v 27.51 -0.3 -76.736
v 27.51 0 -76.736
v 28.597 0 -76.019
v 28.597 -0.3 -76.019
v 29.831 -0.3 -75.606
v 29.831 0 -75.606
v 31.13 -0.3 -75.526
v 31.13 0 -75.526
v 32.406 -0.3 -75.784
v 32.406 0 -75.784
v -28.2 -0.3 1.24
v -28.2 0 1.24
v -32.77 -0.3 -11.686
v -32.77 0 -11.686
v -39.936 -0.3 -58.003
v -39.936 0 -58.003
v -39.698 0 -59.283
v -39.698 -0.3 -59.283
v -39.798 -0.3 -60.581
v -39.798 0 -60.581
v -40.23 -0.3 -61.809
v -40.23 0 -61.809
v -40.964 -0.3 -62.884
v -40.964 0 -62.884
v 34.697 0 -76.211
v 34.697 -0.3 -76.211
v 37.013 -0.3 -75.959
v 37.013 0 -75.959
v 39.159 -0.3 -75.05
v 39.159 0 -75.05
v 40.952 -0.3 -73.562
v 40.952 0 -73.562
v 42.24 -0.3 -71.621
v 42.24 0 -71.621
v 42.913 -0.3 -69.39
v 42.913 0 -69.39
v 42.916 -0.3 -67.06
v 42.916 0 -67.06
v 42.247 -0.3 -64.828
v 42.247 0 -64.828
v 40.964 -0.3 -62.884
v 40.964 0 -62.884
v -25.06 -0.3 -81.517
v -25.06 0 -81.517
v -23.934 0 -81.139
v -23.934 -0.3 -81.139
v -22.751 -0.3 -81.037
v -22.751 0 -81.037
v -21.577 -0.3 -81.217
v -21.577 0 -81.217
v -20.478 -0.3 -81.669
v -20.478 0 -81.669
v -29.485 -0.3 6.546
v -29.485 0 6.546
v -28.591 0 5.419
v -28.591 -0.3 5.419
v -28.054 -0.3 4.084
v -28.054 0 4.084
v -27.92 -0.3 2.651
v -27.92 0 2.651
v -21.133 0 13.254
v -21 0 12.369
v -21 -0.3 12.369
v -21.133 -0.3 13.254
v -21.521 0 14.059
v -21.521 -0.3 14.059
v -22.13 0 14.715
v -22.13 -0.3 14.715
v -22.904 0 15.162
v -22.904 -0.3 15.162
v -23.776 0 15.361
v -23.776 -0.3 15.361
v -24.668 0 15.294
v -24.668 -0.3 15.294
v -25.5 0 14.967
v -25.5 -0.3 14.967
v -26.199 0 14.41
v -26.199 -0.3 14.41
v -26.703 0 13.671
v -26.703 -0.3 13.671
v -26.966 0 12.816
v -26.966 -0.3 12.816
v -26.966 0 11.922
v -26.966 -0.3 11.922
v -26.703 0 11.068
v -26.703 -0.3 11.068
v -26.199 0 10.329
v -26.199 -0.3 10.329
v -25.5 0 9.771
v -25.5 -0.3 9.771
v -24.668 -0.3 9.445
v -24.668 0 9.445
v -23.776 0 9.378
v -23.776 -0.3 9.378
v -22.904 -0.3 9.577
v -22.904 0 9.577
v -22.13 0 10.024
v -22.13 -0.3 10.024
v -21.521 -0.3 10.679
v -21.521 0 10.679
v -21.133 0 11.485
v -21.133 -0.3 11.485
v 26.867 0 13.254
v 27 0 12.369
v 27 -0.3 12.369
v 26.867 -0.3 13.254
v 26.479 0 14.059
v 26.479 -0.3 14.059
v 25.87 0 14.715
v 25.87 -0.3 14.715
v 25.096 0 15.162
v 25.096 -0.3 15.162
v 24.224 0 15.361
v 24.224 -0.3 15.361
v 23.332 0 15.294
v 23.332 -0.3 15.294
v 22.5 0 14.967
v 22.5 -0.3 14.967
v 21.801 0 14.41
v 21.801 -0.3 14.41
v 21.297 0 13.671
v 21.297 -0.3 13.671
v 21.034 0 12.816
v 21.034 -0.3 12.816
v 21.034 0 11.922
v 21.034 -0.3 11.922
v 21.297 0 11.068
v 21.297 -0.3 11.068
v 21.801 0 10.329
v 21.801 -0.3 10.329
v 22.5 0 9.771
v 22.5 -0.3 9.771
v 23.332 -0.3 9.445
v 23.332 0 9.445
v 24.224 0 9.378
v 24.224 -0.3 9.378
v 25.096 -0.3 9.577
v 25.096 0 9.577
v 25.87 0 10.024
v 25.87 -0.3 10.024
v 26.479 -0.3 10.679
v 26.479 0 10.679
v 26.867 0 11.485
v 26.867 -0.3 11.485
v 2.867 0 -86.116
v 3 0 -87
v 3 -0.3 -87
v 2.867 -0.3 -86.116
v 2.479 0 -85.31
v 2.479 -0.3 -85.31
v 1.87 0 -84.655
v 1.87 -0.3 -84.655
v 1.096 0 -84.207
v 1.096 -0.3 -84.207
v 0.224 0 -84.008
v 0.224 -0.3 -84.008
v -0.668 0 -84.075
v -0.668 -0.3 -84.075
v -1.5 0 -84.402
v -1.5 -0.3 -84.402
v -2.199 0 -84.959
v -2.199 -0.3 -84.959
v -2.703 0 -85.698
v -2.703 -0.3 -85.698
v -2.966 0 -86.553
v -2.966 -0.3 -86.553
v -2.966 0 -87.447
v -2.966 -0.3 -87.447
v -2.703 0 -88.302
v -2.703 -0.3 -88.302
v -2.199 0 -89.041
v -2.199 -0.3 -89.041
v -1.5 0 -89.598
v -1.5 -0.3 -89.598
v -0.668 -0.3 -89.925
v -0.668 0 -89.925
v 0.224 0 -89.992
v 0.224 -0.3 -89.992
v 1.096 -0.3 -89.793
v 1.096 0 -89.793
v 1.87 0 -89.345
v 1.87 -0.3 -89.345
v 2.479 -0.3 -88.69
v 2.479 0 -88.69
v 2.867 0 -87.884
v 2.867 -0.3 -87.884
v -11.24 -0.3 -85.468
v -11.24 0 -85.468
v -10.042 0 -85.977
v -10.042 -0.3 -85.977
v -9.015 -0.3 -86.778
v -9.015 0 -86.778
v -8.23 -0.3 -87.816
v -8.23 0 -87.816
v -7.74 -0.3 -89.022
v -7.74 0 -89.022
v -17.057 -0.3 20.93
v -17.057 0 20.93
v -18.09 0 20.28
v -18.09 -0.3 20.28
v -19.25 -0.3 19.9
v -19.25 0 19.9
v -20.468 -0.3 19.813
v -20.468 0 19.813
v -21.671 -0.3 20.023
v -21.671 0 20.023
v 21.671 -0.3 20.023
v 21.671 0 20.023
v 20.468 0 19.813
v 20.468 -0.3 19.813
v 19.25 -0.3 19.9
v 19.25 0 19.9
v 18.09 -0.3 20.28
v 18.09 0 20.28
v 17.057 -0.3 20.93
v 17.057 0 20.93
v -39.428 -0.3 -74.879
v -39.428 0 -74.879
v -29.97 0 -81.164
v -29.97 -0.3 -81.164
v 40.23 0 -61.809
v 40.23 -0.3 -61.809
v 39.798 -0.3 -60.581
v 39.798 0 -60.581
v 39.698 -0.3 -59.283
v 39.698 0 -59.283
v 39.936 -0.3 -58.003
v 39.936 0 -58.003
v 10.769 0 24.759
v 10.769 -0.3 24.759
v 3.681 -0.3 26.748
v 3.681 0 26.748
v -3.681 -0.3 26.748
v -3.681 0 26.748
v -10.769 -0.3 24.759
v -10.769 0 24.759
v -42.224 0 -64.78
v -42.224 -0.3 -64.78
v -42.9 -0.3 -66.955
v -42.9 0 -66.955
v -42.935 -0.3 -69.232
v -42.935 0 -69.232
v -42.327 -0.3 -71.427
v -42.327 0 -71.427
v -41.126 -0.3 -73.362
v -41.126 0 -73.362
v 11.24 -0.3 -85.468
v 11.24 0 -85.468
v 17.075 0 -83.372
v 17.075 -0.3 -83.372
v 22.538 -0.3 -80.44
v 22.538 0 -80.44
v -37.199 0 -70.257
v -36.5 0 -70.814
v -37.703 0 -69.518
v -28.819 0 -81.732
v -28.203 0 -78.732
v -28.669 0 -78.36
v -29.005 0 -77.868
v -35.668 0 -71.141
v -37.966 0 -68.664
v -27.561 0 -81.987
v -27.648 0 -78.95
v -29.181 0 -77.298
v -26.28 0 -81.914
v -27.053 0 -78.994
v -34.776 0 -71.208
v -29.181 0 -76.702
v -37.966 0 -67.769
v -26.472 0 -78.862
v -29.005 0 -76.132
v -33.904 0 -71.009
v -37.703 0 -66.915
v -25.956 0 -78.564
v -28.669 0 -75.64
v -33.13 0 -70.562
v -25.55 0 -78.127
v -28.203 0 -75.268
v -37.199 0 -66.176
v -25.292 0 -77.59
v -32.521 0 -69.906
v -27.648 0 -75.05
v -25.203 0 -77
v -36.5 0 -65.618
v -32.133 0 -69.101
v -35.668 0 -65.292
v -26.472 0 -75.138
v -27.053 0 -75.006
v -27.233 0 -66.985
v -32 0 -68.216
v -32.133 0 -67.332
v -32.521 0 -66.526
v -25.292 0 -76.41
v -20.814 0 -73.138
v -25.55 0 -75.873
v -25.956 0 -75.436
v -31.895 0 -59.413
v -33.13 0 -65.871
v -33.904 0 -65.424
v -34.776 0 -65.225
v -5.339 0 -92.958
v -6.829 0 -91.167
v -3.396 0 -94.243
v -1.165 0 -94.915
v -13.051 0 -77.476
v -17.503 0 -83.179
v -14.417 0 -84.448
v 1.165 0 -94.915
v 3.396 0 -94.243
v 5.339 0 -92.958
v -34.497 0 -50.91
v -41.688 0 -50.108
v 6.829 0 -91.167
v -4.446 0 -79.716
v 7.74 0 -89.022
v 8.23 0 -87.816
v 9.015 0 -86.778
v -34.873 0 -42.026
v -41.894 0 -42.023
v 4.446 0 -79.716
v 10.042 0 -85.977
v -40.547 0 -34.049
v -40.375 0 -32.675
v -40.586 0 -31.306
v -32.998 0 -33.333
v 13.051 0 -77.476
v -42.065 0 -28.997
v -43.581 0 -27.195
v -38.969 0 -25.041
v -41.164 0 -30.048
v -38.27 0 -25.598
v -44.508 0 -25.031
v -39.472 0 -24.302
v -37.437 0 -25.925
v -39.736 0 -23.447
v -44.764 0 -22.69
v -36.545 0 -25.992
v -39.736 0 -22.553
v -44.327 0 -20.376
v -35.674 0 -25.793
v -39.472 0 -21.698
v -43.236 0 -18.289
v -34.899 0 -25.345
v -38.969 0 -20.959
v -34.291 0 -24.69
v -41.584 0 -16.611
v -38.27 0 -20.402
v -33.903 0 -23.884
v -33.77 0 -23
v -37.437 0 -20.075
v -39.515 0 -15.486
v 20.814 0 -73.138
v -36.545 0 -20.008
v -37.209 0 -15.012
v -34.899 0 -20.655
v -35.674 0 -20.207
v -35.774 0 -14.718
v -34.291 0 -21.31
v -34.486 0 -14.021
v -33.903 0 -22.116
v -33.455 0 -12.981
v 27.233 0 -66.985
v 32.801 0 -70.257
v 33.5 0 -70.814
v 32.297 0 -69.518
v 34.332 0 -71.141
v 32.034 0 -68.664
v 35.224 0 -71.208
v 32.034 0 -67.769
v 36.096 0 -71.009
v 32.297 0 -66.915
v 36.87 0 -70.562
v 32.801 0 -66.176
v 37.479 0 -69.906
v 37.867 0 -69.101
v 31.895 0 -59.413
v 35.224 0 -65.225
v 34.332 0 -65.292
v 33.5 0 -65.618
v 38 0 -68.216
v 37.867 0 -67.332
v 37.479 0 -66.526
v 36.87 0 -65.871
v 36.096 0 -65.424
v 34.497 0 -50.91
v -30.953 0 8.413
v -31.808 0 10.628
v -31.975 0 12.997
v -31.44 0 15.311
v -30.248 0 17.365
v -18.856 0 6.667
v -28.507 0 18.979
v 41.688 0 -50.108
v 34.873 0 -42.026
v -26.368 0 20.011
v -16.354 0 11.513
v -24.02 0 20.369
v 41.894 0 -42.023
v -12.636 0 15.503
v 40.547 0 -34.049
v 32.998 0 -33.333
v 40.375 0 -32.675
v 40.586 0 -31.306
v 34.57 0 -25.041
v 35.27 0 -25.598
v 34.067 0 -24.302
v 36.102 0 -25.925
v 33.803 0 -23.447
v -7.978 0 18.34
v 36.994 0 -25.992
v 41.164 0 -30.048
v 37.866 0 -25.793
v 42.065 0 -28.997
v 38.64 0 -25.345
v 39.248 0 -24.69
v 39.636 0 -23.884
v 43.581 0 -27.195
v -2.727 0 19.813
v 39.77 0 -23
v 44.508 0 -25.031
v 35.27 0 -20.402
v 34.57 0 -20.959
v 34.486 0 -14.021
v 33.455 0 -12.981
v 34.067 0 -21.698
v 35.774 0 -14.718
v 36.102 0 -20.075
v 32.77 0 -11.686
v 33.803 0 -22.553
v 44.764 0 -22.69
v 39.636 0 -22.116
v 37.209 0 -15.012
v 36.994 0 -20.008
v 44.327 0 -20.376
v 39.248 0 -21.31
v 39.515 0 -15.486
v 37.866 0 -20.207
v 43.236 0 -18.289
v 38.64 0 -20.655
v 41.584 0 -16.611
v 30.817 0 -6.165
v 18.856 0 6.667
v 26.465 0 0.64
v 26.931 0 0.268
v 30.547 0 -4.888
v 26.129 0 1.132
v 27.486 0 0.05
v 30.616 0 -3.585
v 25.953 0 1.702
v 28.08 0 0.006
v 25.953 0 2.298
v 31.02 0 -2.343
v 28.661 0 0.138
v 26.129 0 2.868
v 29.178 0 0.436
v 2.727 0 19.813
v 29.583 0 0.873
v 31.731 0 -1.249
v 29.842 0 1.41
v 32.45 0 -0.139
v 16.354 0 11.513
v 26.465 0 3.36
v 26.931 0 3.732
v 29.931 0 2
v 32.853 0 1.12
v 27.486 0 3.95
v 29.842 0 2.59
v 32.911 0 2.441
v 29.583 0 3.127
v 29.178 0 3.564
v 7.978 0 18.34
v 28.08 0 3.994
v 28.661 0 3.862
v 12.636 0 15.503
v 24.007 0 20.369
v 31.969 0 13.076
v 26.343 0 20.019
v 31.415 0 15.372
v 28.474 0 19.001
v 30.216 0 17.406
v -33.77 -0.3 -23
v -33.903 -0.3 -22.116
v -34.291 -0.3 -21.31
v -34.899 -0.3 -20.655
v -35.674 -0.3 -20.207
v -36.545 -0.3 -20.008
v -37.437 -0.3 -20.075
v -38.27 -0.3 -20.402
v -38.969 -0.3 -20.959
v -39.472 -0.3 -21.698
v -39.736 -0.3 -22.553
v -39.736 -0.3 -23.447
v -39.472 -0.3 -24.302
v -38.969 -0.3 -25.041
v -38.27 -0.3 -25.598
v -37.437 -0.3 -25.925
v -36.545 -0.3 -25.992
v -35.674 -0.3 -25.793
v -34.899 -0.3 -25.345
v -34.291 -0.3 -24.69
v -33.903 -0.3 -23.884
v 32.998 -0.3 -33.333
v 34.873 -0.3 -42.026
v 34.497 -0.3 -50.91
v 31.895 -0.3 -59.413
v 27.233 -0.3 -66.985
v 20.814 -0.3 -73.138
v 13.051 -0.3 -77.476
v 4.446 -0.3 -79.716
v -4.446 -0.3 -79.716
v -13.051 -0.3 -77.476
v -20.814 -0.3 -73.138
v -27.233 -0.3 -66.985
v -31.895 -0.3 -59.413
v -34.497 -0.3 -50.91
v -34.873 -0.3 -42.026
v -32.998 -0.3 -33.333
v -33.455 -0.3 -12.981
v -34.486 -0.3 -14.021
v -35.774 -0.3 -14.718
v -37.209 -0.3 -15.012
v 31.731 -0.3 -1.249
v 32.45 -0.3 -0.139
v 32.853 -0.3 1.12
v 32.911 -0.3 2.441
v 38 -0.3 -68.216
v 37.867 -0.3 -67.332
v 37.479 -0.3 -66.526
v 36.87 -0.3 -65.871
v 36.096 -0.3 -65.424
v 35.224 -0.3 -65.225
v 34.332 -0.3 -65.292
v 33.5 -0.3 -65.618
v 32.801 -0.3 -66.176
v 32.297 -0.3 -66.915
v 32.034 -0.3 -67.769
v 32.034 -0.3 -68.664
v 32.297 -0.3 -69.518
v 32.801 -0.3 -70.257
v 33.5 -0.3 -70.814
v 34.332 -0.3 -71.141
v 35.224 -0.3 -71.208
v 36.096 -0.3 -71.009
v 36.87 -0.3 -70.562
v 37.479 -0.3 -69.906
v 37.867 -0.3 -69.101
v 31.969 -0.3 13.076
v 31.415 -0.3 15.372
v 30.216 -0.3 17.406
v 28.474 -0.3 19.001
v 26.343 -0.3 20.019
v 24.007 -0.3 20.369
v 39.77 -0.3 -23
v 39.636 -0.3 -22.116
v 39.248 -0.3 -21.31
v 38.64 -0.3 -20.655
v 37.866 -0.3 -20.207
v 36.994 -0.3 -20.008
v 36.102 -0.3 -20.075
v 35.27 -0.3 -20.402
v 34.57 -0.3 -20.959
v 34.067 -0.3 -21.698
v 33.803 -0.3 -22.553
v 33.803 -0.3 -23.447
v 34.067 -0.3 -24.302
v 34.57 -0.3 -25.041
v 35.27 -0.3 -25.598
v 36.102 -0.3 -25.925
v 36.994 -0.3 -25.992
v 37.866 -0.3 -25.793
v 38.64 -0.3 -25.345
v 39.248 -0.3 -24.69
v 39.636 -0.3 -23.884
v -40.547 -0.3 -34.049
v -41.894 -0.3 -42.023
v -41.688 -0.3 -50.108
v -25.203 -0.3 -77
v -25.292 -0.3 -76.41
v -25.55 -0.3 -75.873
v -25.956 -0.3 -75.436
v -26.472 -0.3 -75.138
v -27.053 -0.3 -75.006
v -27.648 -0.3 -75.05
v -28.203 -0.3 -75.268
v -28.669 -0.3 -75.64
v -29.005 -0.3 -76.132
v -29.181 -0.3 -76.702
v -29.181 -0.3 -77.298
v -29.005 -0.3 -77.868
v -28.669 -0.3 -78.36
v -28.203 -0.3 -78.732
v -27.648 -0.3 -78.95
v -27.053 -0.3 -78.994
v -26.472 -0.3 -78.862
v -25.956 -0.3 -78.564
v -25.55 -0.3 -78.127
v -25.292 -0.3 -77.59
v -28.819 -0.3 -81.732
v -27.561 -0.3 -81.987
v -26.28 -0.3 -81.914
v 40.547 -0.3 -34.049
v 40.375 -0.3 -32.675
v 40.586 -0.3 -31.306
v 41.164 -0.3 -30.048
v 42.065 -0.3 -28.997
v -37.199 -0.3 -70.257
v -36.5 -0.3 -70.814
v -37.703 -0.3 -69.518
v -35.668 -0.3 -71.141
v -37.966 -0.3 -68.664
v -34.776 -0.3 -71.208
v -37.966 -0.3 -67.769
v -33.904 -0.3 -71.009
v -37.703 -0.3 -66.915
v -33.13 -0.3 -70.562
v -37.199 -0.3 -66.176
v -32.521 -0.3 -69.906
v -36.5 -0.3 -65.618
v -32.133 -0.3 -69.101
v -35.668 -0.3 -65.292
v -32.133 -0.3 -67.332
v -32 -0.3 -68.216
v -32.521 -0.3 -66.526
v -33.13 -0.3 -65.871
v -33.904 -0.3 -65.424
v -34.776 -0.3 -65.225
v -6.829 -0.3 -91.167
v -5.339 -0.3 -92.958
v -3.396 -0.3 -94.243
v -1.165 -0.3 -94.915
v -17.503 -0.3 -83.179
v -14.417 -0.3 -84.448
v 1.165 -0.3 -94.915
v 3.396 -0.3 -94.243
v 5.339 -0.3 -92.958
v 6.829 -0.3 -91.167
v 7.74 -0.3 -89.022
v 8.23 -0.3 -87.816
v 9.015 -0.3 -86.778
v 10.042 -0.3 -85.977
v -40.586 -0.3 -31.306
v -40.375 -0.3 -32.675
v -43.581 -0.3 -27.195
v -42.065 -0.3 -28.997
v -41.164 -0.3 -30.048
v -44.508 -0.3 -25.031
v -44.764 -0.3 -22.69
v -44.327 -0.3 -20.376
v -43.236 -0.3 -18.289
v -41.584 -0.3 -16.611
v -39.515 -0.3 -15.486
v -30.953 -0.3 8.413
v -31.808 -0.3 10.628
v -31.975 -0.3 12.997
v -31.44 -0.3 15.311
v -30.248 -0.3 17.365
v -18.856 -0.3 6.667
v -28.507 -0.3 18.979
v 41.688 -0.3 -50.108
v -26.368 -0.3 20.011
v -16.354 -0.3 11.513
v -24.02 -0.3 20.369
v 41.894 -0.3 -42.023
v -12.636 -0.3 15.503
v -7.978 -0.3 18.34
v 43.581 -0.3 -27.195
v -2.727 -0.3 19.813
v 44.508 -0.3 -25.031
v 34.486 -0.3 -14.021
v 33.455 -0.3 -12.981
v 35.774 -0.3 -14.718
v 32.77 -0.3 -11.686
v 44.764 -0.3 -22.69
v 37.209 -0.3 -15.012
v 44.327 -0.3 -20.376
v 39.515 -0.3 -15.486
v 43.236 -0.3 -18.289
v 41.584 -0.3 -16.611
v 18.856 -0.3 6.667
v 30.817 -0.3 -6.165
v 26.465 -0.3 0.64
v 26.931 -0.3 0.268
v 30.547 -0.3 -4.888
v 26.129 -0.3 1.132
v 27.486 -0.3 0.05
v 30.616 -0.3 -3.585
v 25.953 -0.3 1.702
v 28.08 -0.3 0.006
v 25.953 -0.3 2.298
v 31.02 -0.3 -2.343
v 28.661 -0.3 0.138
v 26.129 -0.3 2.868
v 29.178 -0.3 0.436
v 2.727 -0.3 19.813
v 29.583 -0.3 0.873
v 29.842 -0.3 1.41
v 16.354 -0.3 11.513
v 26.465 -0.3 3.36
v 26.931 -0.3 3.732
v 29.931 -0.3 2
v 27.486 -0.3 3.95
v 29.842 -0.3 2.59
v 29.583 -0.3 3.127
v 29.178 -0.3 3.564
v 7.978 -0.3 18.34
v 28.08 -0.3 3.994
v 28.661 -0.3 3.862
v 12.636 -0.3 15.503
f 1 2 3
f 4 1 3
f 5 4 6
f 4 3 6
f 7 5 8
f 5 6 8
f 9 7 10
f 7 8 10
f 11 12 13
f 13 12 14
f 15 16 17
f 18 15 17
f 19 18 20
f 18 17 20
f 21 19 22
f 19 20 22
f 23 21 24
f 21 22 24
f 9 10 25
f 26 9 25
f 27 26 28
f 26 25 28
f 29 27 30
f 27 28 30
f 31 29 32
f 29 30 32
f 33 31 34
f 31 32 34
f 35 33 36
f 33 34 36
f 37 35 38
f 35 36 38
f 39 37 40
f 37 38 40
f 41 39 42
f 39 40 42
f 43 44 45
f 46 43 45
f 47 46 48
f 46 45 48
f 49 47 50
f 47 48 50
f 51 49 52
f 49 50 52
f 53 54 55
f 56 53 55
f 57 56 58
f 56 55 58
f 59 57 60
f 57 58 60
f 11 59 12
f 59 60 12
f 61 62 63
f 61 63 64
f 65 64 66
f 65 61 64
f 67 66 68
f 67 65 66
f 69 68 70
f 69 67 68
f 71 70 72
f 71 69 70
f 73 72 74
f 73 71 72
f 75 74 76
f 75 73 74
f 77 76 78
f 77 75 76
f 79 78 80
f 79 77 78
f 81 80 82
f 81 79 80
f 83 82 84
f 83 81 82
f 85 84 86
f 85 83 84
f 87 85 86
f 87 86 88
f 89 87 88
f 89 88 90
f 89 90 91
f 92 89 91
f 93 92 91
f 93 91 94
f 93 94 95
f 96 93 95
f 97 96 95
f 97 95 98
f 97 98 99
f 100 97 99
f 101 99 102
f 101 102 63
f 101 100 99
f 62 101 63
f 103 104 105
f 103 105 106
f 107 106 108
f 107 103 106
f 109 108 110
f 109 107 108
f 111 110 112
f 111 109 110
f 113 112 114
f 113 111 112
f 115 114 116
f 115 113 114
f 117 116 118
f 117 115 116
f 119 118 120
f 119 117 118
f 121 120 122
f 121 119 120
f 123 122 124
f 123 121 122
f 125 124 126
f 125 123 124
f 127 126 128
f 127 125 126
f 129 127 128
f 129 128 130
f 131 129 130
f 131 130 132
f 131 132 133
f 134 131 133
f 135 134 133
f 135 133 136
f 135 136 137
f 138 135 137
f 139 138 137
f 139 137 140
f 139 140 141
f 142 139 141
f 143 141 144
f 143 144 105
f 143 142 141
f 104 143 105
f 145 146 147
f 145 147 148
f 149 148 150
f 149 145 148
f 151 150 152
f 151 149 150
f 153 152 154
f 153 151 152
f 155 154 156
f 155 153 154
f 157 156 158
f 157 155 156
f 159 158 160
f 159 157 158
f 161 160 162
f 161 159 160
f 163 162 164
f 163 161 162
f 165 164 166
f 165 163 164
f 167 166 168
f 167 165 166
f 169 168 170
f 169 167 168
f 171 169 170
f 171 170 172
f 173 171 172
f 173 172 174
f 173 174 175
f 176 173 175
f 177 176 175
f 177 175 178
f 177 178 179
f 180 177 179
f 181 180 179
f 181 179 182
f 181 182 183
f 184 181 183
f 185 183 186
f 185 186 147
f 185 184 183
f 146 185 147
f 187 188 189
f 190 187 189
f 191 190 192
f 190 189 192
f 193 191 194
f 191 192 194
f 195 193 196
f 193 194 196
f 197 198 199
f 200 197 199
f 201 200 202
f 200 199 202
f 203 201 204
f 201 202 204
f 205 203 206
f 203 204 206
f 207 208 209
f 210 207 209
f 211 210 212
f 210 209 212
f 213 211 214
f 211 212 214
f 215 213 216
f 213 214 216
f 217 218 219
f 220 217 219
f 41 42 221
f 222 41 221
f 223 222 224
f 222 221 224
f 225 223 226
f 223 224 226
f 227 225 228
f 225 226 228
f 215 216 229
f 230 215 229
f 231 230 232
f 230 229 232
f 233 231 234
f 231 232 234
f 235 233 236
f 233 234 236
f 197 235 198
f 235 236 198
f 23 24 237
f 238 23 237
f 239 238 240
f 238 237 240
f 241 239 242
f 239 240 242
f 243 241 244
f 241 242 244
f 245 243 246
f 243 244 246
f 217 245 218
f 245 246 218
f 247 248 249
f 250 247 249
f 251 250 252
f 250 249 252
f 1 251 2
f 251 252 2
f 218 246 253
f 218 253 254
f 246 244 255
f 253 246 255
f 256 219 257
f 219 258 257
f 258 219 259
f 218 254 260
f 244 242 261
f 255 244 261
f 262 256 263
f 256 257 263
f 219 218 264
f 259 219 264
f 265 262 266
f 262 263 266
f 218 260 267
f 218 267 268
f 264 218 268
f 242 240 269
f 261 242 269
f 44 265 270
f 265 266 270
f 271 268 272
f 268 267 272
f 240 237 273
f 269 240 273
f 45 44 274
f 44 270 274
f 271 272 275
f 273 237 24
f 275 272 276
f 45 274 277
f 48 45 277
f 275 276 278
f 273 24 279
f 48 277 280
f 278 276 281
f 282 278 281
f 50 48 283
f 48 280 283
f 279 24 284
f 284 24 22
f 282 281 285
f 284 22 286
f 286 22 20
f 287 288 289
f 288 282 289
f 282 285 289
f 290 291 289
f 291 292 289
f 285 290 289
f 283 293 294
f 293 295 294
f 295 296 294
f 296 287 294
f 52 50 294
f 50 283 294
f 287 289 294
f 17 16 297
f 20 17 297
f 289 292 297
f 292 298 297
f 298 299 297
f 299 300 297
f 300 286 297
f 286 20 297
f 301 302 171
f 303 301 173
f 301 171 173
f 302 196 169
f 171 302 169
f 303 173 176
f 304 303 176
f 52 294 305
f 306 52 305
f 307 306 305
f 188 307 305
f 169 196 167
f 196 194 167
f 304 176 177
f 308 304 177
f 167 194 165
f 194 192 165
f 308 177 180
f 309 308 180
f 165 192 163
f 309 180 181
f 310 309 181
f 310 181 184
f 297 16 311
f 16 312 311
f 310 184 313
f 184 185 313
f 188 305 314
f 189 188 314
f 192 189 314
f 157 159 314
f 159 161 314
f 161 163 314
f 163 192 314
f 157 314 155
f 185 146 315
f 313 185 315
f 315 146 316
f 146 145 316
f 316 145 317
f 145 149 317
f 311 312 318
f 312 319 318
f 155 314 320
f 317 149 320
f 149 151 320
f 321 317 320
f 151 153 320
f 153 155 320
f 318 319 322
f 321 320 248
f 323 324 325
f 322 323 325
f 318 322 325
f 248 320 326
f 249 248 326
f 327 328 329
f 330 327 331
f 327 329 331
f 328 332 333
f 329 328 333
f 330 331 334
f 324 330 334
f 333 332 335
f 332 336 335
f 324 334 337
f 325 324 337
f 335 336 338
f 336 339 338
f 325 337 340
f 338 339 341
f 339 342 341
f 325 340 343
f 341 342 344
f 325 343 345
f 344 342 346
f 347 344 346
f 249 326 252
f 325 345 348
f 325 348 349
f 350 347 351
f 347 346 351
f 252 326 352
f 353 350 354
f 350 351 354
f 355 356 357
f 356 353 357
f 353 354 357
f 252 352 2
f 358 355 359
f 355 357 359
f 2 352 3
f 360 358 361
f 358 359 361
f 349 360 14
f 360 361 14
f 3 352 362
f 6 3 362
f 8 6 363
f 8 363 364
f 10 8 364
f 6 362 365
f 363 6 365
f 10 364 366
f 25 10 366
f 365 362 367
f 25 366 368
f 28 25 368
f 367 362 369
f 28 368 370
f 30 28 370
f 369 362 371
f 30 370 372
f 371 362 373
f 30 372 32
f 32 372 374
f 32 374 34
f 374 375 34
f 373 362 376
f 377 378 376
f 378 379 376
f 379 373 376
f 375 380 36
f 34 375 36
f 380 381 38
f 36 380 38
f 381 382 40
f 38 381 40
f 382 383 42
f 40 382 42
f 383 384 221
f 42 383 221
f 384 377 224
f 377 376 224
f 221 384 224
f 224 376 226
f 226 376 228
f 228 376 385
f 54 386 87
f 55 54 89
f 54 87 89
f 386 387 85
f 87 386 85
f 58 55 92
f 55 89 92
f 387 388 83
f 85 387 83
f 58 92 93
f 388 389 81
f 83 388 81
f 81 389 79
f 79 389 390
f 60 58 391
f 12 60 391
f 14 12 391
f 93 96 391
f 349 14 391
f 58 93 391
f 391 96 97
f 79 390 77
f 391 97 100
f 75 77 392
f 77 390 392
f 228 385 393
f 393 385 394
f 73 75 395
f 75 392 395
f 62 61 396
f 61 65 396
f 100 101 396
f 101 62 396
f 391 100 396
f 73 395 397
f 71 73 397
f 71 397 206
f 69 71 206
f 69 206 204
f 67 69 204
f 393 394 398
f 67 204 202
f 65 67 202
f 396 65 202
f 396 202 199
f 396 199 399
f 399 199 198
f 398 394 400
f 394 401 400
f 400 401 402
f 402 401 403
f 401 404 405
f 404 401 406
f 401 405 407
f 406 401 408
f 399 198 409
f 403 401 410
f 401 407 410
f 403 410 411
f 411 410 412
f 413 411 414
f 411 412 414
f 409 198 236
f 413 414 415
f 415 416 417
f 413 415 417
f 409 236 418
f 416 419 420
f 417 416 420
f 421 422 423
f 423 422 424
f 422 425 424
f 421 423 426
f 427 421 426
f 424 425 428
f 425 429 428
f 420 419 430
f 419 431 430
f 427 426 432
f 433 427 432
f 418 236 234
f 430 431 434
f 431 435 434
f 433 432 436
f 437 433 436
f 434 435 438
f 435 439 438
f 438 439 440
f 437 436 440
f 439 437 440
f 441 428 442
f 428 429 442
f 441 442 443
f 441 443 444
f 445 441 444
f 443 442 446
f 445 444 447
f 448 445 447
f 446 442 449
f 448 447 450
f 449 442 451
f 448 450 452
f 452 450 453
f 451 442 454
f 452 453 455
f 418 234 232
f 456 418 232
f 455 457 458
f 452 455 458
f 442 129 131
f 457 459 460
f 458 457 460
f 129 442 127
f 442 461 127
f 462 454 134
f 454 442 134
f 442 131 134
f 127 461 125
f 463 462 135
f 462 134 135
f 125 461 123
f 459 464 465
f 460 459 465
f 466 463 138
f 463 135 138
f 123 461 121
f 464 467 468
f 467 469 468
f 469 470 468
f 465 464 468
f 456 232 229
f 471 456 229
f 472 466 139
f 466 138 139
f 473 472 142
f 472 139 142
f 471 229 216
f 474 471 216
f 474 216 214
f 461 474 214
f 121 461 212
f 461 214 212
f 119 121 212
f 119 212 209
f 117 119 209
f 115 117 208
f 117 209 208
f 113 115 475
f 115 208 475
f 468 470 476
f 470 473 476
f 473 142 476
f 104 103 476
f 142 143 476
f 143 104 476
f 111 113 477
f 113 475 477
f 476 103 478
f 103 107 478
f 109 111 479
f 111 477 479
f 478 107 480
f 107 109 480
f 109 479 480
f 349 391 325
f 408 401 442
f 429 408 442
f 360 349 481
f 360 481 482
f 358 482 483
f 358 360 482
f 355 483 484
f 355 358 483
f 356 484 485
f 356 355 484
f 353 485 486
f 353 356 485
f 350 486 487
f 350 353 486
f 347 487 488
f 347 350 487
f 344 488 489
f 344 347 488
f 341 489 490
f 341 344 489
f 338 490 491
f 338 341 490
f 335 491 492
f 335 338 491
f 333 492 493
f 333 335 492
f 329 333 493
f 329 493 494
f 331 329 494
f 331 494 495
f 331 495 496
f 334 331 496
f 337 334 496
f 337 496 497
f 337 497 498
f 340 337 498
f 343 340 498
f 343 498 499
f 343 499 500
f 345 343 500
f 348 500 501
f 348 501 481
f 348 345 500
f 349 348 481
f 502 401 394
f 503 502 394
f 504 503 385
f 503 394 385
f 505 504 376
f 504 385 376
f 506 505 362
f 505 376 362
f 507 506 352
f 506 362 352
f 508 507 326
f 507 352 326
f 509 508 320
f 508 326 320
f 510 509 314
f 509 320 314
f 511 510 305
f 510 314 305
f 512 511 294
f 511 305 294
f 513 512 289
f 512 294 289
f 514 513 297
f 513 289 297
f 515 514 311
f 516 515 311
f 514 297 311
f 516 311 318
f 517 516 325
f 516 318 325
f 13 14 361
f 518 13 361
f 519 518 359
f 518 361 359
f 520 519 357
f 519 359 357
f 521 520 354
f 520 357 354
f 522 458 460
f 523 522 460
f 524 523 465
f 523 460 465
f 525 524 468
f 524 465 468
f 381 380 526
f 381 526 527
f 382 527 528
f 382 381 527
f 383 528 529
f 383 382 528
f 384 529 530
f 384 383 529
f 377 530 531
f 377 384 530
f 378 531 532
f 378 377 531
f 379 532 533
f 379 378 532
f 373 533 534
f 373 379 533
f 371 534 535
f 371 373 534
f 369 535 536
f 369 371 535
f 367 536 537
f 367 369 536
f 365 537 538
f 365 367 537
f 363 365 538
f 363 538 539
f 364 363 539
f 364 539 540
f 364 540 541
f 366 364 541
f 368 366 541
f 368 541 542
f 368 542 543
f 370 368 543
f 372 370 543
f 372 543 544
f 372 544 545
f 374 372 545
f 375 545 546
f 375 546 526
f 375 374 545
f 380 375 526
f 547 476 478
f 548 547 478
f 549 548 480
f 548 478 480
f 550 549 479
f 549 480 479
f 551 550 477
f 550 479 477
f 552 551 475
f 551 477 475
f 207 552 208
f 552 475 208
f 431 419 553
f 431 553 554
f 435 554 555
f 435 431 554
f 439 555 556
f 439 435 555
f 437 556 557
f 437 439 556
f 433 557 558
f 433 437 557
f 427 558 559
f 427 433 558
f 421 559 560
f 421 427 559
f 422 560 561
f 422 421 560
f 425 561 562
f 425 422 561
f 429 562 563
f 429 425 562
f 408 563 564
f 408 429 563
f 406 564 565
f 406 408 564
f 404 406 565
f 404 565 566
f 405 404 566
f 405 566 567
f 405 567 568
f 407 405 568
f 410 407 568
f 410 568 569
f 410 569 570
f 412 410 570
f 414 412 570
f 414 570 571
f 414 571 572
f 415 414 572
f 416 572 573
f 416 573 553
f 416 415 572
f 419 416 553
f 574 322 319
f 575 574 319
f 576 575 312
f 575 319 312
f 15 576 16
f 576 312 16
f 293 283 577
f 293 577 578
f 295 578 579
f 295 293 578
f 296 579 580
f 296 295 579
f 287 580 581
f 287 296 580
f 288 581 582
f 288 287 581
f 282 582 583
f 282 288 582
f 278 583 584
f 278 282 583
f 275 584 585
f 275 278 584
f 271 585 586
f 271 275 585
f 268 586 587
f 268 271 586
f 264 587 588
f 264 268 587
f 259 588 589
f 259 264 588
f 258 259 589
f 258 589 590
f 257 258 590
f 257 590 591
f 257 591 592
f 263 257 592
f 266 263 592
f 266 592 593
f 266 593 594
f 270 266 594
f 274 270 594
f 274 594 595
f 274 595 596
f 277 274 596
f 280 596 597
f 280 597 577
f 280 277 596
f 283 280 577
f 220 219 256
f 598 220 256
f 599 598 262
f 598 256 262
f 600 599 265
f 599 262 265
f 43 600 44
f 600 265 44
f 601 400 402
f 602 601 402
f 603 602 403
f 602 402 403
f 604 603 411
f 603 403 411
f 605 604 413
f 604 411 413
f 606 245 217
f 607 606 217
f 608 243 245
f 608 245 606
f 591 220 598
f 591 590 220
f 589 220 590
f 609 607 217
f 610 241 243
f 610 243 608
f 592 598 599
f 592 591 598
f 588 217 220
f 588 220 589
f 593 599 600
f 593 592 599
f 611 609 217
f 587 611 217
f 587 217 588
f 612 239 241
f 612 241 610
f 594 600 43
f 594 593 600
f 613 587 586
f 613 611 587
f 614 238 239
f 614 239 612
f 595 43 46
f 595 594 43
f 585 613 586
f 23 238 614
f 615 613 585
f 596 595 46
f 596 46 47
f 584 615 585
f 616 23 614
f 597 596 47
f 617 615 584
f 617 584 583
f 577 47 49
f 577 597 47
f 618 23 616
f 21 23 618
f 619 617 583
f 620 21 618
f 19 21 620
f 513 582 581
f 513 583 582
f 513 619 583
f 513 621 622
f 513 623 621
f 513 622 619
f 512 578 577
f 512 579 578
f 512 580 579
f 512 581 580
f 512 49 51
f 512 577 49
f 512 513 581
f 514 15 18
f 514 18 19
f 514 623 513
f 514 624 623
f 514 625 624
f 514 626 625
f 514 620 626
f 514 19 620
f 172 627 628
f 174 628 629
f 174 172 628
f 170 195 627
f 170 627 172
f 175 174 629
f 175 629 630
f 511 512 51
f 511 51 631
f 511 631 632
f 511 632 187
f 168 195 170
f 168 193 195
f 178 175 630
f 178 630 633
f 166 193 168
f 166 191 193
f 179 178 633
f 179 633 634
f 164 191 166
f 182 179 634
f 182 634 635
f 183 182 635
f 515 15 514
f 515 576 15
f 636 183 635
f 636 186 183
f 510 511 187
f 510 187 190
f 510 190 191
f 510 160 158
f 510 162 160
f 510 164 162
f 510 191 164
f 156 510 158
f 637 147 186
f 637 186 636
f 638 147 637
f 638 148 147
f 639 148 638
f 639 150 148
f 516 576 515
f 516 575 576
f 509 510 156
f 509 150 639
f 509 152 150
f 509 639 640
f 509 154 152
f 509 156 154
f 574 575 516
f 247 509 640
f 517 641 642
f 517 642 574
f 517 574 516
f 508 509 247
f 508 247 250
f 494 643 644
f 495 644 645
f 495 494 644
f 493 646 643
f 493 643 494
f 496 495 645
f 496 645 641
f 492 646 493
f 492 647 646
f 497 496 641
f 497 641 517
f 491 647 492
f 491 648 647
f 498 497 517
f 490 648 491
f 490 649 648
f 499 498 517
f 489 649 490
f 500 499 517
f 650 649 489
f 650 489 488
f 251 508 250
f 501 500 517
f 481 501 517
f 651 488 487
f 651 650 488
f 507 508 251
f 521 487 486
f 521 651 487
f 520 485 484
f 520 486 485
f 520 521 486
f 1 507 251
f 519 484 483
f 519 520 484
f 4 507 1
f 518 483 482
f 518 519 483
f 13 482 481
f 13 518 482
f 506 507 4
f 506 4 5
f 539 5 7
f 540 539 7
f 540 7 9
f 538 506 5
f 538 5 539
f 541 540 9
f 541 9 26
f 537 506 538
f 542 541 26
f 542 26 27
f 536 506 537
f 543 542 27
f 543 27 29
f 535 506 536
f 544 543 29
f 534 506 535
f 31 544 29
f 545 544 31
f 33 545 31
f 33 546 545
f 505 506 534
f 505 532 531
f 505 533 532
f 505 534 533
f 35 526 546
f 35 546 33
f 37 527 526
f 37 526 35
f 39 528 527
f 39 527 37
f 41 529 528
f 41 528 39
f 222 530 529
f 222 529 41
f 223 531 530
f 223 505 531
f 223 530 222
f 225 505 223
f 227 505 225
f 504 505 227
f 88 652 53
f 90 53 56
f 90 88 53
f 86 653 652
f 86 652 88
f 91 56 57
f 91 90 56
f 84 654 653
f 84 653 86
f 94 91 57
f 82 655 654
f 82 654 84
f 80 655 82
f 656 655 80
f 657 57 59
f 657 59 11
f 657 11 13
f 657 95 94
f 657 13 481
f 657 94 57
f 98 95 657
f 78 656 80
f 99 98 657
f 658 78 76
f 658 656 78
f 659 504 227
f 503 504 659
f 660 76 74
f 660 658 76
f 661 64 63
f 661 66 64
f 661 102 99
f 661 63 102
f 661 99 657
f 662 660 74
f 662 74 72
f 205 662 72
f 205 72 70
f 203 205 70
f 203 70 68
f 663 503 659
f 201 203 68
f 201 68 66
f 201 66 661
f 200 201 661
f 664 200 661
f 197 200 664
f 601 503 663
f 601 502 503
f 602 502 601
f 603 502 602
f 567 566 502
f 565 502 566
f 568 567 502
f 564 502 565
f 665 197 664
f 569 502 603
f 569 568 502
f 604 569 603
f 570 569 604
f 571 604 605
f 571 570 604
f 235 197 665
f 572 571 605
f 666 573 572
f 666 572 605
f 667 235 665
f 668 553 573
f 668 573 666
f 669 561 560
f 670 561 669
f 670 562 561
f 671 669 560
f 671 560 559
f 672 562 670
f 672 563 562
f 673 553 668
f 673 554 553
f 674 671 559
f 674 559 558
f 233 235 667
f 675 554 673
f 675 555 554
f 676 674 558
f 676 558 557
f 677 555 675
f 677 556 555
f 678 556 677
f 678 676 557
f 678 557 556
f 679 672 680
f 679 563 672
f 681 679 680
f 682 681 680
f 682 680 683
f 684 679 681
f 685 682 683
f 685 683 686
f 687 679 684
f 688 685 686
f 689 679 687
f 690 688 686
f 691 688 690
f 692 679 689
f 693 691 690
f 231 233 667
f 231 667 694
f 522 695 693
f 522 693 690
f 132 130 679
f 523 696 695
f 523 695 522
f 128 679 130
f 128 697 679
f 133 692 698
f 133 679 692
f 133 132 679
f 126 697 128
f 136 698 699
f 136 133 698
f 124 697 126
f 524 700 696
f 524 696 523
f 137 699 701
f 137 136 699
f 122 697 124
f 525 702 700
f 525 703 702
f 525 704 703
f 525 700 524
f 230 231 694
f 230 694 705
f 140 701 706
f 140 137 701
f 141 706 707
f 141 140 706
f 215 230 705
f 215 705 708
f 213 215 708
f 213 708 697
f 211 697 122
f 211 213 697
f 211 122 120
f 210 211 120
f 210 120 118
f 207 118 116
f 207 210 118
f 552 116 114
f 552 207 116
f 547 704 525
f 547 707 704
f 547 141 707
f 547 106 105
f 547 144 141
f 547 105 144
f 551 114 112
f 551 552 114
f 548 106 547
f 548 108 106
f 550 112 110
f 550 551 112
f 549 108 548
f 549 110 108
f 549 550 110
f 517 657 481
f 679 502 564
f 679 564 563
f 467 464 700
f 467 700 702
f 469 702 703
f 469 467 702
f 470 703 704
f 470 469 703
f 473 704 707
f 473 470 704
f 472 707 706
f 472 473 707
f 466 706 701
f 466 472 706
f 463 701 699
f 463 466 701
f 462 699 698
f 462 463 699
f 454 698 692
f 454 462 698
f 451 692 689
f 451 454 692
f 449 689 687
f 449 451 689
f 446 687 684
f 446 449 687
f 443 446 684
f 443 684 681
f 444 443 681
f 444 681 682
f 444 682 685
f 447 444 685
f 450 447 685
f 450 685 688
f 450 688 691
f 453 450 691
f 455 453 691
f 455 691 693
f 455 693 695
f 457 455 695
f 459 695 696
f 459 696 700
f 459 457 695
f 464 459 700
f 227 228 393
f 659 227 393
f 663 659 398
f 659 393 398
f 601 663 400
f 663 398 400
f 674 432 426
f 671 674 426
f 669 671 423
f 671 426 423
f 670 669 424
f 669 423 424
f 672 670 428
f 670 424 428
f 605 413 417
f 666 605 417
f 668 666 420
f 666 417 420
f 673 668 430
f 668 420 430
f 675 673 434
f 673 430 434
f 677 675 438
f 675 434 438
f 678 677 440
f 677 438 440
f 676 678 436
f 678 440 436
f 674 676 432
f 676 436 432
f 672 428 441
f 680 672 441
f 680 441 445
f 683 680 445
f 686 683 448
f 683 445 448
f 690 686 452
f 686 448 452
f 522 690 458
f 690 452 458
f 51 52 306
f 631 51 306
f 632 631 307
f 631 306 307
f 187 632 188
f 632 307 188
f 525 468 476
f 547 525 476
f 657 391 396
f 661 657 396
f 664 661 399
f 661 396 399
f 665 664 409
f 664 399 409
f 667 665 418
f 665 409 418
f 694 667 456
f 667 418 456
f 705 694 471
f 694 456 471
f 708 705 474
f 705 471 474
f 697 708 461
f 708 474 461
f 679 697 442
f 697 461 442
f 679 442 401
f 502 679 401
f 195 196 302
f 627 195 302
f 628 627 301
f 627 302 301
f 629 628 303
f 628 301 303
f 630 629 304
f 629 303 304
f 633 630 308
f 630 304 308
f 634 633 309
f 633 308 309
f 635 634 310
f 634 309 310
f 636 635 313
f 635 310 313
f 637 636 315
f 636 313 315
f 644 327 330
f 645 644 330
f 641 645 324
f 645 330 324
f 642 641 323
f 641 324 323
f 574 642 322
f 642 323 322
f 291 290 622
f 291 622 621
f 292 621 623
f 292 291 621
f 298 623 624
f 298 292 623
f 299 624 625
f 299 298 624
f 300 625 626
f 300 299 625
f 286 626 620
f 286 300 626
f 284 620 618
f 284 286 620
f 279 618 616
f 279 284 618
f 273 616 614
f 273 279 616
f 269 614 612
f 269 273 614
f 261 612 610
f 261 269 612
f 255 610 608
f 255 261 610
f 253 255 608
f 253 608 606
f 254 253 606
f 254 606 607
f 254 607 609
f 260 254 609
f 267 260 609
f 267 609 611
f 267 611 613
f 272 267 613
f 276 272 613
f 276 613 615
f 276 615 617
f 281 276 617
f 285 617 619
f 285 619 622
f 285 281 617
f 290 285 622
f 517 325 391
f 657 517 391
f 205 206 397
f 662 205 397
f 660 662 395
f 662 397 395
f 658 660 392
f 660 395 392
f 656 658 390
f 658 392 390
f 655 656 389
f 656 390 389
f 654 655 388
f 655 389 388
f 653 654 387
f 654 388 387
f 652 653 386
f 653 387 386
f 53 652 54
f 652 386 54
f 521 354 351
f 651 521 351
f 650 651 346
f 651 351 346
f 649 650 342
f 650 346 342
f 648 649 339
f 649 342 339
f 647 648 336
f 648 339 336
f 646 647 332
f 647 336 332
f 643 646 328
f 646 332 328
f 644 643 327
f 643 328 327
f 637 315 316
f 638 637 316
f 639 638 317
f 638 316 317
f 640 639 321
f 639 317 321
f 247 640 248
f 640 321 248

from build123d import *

# Parameters (mm, degrees)
F0_R     = 3
F0_R_2   = 2
F1_DEPTH = 0.3


with BuildPart() as f1:
    # F0 (on Front) → F1 (new body)
    with BuildSketch(Plane.XZ):
        with BuildLine():
            ThreePointArc((21.670889, 20.022763), (19.250386, 19.900136), (17.05657, 20.930204))
            ThreePointArc((17.05657, 20.930204), (0, 27), (-17.05657, 20.930204))
            ThreePointArc((-17.05657, 20.930204), (-19.250386, 19.900136), (-21.670889, 20.022763))
            ThreePointArc((-21.670889, 20.022763), (-30.920732, 16.38223), (-29.485281, 6.545942))
            ThreePointArc((-29.485281, 6.545942), (-28.0542, 4.083792), (-28.199536, 1.239666))
            Line((-28.199536, 1.239666), (-32.769553, -11.686292))
            ThreePointArc((-32.769553, -11.686292), (-34.485775, -14.021257), (-37.208965, -15.012077))
            ThreePointArc((-37.208965, -15.012077), (-44.32696, -20.375958), (-42.064669, -28.996811))
            ThreePointArc((-42.064669, -28.996811), (-40.585524, -31.306286), (-40.547083, -34.04856))
            ThreePointArc((-40.547083, -34.04856), (-41.986361, -46.070271), (-39.936462, -58.003039))
            ThreePointArc((-39.936462, -58.003039), (-39.797967, -60.58066), (-40.963571, -62.883848))
            ThreePointArc((-40.963571, -62.883848), (-42.935234, -69.23228), (-39.427861, -74.879259))
            Line((-39.427861, -74.879259), (-29.970354, -81.164303))
            ThreePointArc((-29.970354, -81.164303), (-27.561454, -81.98713), (-25.05963, -81.517324))
            ThreePointArc((-25.05963, -81.517324), (-22.750585, -81.037396), (-20.478412, -81.66926))
            ThreePointArc((-20.478412, -81.66926), (-15.972467, -83.844308), (-11.239844, -85.468085))
            ThreePointArc((-11.239844, -85.468085), (-9.01527, -86.777506), (-7.740259, -89.021978))
            ThreePointArc((-7.740259, -89.021978), (0, -95), (7.740259, -89.021978))
            ThreePointArc((7.740259, -89.021978), (9.01527, -86.777506), (11.239844, -85.468085))
            ThreePointArc((11.239844, -85.468085), (19.86092, -82.007349), (27.510347, -76.736112))
            ThreePointArc((27.510347, -76.736112), (29.83121, -75.606111), (32.406393, -75.78428))
            ThreePointArc((32.406393, -75.78428), (41.666667, -72.63854), (40.963571, -62.883848))
            ThreePointArc((40.963571, -62.883848), (39.797967, -60.58066), (39.936462, -58.003039))
            ThreePointArc((39.936462, -58.003039), (41.986361, -46.070271), (40.547083, -34.04856))
            ThreePointArc((40.547083, -34.04856), (40.585524, -31.306286), (42.064669, -28.996811))
            ThreePointArc((42.064669, -28.996811), (44.32696, -20.375958), (37.208965, -15.012077))
            ThreePointArc((37.208965, -15.012077), (34.485775, -14.021257), (32.769553, -11.686292))
            Line((32.769553, -11.686292), (30.817469, -6.164966))
            ThreePointArc((30.817469, -6.164966), (30.615698, -3.584652), (31.731116, -1.24915))
            ThreePointArc((31.731116, -1.24915), (32.693172, 0.477163), (32.911198, 2.441385))
            Line((32.911198, 2.441385), (31.968768, 13.075533))
            ThreePointArc((31.968768, 13.075533), (28.474085, 19.001252), (21.670889, 20.022763))
        make_face()
        with Locations((-35, -68.216374)):
            Circle(F0_R, mode=Mode.SUBTRACT)
        with Locations((-27.202941, -77)):
            Circle(F0_R_2, mode=Mode.SUBTRACT)
        with Locations((0, -87)):
            Circle(F0_R, mode=Mode.SUBTRACT)
        with Locations((35, -68.216374)):
            Circle(F0_R, mode=Mode.SUBTRACT)
        with Locations((-36.769553, -23)):
            Circle(F0_R, mode=Mode.SUBTRACT)
        with Locations((-24, 12.369317)):
            Circle(F0_R, mode=Mode.SUBTRACT)
        with BuildLine():
            Line((-32.998316, -33.333333), (-18.856181, 6.666667))
            ThreePointArc((-18.856181, 6.666667), (0, 20), (18.856181, 6.666667))
            Line((18.856181, 6.666667), (32.998316, -33.333333))
            ThreePointArc((32.998316, -33.333333), (0, -80), (-32.998316, -33.333333))
        make_face(mode=Mode.SUBTRACT)
        with Locations((36.769553, -23)):
            Circle(F0_R, mode=Mode.SUBTRACT)
        with Locations((27.930718, 2)):
            Circle(F0_R_2, mode=Mode.SUBTRACT)
        with Locations((24, 12.369317)):
            Circle(F0_R, mode=Mode.SUBTRACT)
    extrude(amount=F1_DEPTH)


solid = f1.part
